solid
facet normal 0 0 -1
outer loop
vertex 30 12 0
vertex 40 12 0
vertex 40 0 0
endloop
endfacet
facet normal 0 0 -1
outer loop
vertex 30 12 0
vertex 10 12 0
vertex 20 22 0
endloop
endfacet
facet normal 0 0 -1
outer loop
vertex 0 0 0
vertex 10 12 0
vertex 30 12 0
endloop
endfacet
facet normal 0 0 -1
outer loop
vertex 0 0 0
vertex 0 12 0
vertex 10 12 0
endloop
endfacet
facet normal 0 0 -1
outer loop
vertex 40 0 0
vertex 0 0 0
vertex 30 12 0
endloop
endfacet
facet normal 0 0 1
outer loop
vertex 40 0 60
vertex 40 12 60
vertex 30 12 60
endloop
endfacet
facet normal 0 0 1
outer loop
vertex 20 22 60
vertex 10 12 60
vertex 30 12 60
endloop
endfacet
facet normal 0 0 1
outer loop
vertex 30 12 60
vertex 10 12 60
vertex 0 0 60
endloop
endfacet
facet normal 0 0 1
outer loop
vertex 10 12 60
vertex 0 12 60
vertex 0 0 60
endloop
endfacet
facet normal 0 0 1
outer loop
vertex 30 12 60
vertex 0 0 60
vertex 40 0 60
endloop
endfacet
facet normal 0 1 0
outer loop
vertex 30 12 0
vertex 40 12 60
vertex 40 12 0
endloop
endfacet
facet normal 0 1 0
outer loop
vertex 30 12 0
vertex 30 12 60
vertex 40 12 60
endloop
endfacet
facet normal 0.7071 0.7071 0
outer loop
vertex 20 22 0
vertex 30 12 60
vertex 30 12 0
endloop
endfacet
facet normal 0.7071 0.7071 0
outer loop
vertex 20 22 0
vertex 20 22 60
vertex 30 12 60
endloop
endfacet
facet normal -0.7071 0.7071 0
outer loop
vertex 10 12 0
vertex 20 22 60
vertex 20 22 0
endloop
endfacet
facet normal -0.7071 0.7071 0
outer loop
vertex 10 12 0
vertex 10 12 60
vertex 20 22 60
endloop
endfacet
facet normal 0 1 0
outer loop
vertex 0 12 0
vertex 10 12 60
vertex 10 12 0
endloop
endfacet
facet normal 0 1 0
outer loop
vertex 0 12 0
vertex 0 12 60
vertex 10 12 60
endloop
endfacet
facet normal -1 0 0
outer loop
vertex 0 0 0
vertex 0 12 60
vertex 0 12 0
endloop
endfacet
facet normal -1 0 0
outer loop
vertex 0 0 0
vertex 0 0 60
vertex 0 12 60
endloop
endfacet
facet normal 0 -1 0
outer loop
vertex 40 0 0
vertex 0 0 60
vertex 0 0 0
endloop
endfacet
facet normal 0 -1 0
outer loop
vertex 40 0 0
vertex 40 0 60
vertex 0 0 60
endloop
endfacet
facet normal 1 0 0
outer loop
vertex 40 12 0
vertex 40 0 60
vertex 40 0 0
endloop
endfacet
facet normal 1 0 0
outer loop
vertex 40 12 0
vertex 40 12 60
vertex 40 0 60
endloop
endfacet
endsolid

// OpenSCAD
$fn = 32;

// ----------------------------------------------------------------------
// V guide rail: vrib, 40 mm wide
// ----------------------------------------------------------------------

// --- parameters (mm) ---
rail_w = 40;              // rail width, X
base_t = 12;              // base plate thickness
v_depth = 10;             // V feature depth / height
v_half_w = 10;            // half width of the V at the base face
plate_t = 60;             // rail length, Z (the extrusion height)

profile = [[0, 0], [40, 0], [40, 12], [30, 12], [20, 22], [10, 12], [0, 12]];  // primary outline, 7 points, counter clockwise

// --- the one profile operation ---
linear_extrude(height = plate_t) polygon(points = profile);
